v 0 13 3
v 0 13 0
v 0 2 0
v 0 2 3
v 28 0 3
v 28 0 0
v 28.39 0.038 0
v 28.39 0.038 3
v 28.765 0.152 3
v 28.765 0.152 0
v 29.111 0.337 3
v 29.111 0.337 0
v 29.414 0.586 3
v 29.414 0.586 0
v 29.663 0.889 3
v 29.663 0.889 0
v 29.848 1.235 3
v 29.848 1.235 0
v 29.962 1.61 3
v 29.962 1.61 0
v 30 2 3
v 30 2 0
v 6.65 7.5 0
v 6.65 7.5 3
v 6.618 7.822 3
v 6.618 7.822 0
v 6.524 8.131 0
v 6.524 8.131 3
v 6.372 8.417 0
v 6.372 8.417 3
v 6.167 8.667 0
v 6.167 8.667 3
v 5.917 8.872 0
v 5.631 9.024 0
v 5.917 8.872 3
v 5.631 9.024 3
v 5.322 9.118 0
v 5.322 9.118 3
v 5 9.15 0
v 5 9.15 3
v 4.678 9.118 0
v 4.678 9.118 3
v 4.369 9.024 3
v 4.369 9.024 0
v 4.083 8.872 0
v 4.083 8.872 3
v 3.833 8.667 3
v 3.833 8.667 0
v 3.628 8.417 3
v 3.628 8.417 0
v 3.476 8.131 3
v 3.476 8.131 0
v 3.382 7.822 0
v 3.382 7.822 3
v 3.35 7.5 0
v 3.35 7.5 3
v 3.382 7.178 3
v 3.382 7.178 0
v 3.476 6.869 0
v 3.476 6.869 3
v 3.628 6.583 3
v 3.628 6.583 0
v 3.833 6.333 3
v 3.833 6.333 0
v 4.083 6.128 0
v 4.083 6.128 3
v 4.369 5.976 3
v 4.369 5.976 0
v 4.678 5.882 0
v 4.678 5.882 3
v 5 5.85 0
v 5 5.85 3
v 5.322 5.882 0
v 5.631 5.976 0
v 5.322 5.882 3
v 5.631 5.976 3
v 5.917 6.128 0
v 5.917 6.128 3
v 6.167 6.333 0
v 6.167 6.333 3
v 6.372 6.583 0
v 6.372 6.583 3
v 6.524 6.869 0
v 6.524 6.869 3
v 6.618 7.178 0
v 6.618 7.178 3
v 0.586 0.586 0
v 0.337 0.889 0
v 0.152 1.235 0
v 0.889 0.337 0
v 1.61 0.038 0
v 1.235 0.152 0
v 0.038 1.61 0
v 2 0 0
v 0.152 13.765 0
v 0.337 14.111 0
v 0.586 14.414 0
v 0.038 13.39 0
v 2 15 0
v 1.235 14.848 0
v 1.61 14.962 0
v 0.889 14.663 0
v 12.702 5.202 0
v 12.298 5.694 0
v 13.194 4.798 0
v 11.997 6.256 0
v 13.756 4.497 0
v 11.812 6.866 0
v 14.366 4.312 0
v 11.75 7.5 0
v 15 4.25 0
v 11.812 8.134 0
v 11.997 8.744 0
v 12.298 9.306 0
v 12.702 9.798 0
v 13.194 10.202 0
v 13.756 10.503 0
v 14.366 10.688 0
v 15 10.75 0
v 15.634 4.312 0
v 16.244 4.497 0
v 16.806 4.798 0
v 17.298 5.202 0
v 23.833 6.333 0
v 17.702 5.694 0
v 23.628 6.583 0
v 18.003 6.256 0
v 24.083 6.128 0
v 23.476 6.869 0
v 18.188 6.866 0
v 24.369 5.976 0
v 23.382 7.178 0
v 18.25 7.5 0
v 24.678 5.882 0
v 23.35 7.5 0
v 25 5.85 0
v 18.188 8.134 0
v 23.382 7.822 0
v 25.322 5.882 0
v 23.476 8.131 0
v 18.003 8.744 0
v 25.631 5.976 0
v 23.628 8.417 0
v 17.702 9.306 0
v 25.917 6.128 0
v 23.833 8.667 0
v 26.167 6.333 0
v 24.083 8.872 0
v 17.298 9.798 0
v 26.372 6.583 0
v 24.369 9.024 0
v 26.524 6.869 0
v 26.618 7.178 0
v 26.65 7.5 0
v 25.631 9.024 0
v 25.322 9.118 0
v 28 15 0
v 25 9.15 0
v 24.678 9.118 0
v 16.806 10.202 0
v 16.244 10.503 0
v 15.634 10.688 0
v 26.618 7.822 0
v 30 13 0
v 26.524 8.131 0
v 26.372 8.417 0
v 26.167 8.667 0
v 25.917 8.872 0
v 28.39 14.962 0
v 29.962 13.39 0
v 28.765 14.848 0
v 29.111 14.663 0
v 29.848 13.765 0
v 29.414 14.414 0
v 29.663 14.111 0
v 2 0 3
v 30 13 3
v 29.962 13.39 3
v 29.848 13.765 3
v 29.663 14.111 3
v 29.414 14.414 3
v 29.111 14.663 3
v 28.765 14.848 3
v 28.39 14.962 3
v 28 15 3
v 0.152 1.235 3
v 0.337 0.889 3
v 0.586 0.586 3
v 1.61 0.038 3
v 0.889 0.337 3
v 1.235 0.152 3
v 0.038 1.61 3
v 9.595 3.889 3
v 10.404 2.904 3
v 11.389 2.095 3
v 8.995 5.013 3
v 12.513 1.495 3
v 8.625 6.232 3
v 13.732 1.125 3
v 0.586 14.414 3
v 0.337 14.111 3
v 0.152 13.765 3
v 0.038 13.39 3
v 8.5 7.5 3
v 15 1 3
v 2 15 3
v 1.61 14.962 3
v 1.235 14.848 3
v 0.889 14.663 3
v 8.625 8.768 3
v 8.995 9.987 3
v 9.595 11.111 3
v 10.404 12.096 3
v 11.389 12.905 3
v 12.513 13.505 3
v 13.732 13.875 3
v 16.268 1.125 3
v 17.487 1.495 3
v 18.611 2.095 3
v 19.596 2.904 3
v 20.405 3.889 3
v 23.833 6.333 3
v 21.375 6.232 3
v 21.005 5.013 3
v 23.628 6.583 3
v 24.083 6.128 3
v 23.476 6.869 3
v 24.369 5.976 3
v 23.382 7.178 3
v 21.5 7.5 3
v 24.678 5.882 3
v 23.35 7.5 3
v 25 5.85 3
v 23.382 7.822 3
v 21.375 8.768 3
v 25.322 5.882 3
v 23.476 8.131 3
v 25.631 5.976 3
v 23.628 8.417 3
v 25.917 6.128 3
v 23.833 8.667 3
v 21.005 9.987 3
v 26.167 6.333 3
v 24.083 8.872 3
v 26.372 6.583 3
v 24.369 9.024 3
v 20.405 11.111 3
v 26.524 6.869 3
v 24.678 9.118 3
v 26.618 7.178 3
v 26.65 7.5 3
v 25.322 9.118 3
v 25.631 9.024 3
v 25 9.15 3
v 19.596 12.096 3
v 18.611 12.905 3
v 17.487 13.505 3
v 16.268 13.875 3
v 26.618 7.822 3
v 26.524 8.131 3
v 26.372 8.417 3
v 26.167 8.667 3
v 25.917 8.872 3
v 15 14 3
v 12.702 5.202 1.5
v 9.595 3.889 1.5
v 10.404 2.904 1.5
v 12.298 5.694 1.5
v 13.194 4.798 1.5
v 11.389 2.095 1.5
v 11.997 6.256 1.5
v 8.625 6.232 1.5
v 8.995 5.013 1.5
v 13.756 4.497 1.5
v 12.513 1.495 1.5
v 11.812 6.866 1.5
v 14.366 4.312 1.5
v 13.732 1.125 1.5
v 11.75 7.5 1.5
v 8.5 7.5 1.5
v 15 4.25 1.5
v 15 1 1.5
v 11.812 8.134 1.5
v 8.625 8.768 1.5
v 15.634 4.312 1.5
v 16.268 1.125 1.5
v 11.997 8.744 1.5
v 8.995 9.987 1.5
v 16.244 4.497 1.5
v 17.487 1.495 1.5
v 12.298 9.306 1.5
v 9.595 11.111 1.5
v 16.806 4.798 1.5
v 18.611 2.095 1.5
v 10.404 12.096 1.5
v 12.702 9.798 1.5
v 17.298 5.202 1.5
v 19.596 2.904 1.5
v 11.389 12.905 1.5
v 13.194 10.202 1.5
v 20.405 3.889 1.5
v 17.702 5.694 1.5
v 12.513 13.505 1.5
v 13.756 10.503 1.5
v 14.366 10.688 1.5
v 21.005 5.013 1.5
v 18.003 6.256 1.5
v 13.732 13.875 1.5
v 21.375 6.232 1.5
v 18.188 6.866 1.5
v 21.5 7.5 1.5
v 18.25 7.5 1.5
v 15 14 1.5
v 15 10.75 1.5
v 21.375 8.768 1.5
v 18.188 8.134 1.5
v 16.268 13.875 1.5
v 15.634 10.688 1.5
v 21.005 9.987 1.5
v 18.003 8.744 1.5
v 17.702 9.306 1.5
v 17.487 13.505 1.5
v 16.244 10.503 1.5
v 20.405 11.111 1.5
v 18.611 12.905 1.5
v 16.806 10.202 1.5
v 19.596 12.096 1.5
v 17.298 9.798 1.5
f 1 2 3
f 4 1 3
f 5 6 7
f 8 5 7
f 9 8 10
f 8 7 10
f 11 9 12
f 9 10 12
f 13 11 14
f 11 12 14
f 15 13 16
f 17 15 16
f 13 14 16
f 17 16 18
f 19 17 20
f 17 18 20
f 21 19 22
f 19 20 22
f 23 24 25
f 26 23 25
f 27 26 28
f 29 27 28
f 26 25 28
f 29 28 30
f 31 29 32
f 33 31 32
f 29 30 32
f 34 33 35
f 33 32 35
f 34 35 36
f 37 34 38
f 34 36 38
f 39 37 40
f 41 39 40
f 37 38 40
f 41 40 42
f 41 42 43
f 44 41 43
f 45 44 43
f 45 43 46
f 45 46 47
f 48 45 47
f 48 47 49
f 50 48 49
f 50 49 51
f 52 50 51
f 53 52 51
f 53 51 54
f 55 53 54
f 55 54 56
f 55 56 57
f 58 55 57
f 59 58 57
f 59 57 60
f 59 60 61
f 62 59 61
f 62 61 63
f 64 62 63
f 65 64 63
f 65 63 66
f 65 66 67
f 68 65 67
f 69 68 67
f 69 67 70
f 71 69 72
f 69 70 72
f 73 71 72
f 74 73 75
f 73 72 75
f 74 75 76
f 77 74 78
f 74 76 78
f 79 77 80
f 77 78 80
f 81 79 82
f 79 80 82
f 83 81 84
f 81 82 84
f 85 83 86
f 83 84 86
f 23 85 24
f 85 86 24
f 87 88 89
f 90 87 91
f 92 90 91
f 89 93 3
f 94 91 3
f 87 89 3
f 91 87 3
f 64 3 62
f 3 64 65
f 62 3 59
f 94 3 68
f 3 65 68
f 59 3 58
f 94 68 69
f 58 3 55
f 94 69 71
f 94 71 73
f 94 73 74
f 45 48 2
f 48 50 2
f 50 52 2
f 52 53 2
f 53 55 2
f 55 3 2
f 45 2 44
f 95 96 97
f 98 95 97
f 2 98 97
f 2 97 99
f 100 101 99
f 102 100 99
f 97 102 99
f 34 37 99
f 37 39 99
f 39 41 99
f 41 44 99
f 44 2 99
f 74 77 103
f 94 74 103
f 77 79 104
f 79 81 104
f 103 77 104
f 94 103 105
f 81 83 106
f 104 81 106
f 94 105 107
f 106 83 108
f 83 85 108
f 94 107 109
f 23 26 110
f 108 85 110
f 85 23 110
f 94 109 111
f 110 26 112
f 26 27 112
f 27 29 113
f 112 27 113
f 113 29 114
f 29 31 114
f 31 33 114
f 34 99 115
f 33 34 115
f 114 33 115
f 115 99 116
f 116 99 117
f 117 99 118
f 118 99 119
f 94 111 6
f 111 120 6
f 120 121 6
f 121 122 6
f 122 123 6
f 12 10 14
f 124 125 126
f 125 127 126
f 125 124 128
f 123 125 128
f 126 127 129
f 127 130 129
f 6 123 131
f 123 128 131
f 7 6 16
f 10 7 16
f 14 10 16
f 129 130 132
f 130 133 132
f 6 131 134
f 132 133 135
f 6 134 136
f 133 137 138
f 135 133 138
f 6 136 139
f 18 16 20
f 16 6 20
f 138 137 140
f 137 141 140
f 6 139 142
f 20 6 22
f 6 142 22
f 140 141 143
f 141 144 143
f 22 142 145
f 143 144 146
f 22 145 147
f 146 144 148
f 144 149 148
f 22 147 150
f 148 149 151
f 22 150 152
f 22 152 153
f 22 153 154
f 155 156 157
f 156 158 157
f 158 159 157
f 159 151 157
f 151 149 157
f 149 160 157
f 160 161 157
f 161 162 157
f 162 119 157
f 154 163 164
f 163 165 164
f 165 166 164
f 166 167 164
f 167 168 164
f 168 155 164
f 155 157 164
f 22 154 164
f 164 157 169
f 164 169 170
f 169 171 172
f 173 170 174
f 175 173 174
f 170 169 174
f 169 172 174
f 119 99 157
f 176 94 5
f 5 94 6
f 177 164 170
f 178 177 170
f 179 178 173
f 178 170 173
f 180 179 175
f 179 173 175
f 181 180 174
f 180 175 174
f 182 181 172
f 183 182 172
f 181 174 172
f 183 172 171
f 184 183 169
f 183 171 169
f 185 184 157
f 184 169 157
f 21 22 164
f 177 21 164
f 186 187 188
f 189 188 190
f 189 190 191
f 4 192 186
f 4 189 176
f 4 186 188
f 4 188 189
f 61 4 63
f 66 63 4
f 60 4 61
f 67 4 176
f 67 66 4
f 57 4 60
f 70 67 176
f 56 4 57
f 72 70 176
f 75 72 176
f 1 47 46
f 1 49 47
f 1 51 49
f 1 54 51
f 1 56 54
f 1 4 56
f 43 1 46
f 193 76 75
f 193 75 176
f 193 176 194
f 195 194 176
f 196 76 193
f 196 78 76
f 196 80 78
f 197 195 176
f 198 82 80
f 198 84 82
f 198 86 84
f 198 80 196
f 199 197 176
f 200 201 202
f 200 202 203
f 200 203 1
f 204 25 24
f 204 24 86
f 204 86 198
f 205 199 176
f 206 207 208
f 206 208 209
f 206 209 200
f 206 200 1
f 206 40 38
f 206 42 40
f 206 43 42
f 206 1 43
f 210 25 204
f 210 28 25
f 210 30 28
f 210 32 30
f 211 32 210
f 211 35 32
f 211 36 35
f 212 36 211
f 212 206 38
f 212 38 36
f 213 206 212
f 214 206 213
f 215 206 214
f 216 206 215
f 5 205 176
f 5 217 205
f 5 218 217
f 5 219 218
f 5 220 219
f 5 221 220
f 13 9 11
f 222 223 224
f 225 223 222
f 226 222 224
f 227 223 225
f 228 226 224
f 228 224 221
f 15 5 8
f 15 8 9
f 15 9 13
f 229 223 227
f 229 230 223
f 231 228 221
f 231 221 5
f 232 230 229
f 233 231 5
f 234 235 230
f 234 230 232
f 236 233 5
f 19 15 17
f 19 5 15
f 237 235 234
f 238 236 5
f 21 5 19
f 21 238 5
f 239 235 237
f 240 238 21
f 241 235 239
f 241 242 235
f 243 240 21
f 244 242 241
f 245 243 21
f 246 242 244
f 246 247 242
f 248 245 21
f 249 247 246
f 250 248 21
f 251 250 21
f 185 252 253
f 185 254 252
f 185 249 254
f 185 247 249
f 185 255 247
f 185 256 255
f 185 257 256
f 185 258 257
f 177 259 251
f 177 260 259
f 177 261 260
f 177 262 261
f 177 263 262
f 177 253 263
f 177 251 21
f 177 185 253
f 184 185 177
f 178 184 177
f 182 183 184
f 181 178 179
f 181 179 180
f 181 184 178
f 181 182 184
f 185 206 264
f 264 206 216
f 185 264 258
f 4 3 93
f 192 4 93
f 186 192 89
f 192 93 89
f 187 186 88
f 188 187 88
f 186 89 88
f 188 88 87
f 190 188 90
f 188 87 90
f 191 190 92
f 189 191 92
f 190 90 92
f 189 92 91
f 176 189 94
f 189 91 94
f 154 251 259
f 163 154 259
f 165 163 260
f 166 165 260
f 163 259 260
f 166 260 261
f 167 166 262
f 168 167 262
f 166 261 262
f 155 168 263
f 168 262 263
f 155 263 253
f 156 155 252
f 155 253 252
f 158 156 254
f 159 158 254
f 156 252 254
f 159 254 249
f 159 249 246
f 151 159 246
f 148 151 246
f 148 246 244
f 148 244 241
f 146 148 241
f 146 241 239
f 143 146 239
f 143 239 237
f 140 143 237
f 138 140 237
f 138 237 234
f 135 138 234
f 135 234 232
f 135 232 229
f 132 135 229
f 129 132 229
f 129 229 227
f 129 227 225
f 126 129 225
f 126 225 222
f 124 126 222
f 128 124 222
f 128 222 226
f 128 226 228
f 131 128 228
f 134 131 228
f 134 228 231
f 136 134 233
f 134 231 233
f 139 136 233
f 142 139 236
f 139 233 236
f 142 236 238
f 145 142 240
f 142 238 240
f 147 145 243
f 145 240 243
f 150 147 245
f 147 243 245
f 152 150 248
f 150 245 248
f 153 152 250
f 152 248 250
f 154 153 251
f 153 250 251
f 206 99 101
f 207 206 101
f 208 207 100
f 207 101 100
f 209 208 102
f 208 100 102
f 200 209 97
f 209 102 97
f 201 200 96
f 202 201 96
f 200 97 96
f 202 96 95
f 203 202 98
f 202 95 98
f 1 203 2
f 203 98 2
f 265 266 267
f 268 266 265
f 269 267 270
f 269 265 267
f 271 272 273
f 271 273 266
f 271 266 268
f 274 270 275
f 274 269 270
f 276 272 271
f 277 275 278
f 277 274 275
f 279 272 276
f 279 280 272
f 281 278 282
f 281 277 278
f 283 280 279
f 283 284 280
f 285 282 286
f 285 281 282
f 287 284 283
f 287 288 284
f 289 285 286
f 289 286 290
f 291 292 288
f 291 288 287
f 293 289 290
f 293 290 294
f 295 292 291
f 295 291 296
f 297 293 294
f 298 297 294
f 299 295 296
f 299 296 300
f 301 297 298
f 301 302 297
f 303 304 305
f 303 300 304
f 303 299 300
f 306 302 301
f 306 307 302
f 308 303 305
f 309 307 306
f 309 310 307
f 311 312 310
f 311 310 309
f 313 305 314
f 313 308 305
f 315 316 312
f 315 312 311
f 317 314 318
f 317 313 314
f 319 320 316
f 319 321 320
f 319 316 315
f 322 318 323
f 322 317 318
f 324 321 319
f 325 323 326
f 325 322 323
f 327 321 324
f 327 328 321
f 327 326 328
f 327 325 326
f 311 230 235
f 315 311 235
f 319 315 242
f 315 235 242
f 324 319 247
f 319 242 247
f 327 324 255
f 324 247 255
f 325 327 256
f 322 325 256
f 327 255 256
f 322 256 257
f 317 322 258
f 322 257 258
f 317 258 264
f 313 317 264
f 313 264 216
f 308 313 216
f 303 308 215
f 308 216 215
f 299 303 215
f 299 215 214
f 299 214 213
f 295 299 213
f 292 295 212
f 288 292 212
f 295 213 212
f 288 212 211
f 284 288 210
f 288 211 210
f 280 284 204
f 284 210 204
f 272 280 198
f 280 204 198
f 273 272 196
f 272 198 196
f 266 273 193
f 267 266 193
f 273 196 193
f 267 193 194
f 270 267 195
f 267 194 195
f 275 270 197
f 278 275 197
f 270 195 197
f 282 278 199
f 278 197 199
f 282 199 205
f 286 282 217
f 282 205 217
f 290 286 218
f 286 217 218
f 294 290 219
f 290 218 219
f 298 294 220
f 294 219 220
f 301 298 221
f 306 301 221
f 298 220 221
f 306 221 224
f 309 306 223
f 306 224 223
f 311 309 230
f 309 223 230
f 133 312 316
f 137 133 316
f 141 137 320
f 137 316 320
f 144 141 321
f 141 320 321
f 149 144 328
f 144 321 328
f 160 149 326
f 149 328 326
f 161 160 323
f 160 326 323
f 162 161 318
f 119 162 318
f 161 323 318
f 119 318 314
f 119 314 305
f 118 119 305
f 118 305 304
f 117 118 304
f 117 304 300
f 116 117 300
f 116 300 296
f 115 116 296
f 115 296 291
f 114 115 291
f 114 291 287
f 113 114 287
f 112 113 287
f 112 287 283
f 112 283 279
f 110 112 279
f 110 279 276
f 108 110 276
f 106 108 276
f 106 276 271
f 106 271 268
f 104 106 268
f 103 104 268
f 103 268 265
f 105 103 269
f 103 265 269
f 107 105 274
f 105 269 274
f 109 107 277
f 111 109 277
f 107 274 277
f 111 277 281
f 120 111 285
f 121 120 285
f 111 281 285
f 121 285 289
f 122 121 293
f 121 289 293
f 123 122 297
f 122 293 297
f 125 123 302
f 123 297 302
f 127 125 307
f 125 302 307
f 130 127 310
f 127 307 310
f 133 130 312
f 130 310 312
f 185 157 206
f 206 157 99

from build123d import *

# Parameters (mm, degrees)
EXTRUDE_1_DEPTH     = 3
SKETCH_2_R          = 6.5
CUT_EXTRUDE_1_DEPTH = 1.5
SKETCH_3_R          = 3.25
CUT_EXTRUDE_2_DEPTH = 34.674916481
SKETCH_4_R          = 1.65
CUT_EXTRUDE_3_DEPTH = 34.674916481


with BuildPart() as part:
    # Эскиз1 → Бобышка-Вытянуть1 (new body)
    with BuildSketch(Plane.XY):
        with BuildLine():
            Line((2, 0), (28, 0))
            ThreePointArc((28, 0), (29.414213562, 0.585786438), (30, 2))
            Line((30, 2), (30, 13))
            ThreePointArc((30, 13), (29.414213562, 14.414213562), (28, 15))
            Line((28, 15), (2, 15))
            ThreePointArc((2, 15), (0.585786438, 14.414213562), (0, 13))
            Line((0, 13), (0, 2))
            ThreePointArc((0, 2), (0.585786438, 0.585786438), (2, 0))
        make_face()
    extrude(amount=EXTRUDE_1_DEPTH)

    # Эскиз2 → Вырез-Вытянуть1 (cut)
    with BuildSketch(Plane.XY.offset(3)):
        with Locations((15, 7.5)):
            Circle(SKETCH_2_R)
    extrude(amount=-CUT_EXTRUDE_1_DEPTH, mode=Mode.SUBTRACT)

    # Эскиз3 → Вырез-Вытянуть2 (cut, through all)
    with BuildSketch(Plane.XY.offset(3)):
        with Locations((15, 7.5)):
            Circle(SKETCH_3_R)
    extrude(amount=-CUT_EXTRUDE_2_DEPTH, mode=Mode.SUBTRACT)

    # Эскиз4 → Вырез-Вытянуть3 (cut, through all)
    with BuildSketch(Plane.XY.offset(3)):
        with Locations((5, 7.5)):
            Circle(SKETCH_4_R)
        with Locations((25, 7.5)):
            Circle(SKETCH_4_R)
    extrude(amount=-CUT_EXTRUDE_3_DEPTH, mode=Mode.SUBTRACT)


solid = part.part
